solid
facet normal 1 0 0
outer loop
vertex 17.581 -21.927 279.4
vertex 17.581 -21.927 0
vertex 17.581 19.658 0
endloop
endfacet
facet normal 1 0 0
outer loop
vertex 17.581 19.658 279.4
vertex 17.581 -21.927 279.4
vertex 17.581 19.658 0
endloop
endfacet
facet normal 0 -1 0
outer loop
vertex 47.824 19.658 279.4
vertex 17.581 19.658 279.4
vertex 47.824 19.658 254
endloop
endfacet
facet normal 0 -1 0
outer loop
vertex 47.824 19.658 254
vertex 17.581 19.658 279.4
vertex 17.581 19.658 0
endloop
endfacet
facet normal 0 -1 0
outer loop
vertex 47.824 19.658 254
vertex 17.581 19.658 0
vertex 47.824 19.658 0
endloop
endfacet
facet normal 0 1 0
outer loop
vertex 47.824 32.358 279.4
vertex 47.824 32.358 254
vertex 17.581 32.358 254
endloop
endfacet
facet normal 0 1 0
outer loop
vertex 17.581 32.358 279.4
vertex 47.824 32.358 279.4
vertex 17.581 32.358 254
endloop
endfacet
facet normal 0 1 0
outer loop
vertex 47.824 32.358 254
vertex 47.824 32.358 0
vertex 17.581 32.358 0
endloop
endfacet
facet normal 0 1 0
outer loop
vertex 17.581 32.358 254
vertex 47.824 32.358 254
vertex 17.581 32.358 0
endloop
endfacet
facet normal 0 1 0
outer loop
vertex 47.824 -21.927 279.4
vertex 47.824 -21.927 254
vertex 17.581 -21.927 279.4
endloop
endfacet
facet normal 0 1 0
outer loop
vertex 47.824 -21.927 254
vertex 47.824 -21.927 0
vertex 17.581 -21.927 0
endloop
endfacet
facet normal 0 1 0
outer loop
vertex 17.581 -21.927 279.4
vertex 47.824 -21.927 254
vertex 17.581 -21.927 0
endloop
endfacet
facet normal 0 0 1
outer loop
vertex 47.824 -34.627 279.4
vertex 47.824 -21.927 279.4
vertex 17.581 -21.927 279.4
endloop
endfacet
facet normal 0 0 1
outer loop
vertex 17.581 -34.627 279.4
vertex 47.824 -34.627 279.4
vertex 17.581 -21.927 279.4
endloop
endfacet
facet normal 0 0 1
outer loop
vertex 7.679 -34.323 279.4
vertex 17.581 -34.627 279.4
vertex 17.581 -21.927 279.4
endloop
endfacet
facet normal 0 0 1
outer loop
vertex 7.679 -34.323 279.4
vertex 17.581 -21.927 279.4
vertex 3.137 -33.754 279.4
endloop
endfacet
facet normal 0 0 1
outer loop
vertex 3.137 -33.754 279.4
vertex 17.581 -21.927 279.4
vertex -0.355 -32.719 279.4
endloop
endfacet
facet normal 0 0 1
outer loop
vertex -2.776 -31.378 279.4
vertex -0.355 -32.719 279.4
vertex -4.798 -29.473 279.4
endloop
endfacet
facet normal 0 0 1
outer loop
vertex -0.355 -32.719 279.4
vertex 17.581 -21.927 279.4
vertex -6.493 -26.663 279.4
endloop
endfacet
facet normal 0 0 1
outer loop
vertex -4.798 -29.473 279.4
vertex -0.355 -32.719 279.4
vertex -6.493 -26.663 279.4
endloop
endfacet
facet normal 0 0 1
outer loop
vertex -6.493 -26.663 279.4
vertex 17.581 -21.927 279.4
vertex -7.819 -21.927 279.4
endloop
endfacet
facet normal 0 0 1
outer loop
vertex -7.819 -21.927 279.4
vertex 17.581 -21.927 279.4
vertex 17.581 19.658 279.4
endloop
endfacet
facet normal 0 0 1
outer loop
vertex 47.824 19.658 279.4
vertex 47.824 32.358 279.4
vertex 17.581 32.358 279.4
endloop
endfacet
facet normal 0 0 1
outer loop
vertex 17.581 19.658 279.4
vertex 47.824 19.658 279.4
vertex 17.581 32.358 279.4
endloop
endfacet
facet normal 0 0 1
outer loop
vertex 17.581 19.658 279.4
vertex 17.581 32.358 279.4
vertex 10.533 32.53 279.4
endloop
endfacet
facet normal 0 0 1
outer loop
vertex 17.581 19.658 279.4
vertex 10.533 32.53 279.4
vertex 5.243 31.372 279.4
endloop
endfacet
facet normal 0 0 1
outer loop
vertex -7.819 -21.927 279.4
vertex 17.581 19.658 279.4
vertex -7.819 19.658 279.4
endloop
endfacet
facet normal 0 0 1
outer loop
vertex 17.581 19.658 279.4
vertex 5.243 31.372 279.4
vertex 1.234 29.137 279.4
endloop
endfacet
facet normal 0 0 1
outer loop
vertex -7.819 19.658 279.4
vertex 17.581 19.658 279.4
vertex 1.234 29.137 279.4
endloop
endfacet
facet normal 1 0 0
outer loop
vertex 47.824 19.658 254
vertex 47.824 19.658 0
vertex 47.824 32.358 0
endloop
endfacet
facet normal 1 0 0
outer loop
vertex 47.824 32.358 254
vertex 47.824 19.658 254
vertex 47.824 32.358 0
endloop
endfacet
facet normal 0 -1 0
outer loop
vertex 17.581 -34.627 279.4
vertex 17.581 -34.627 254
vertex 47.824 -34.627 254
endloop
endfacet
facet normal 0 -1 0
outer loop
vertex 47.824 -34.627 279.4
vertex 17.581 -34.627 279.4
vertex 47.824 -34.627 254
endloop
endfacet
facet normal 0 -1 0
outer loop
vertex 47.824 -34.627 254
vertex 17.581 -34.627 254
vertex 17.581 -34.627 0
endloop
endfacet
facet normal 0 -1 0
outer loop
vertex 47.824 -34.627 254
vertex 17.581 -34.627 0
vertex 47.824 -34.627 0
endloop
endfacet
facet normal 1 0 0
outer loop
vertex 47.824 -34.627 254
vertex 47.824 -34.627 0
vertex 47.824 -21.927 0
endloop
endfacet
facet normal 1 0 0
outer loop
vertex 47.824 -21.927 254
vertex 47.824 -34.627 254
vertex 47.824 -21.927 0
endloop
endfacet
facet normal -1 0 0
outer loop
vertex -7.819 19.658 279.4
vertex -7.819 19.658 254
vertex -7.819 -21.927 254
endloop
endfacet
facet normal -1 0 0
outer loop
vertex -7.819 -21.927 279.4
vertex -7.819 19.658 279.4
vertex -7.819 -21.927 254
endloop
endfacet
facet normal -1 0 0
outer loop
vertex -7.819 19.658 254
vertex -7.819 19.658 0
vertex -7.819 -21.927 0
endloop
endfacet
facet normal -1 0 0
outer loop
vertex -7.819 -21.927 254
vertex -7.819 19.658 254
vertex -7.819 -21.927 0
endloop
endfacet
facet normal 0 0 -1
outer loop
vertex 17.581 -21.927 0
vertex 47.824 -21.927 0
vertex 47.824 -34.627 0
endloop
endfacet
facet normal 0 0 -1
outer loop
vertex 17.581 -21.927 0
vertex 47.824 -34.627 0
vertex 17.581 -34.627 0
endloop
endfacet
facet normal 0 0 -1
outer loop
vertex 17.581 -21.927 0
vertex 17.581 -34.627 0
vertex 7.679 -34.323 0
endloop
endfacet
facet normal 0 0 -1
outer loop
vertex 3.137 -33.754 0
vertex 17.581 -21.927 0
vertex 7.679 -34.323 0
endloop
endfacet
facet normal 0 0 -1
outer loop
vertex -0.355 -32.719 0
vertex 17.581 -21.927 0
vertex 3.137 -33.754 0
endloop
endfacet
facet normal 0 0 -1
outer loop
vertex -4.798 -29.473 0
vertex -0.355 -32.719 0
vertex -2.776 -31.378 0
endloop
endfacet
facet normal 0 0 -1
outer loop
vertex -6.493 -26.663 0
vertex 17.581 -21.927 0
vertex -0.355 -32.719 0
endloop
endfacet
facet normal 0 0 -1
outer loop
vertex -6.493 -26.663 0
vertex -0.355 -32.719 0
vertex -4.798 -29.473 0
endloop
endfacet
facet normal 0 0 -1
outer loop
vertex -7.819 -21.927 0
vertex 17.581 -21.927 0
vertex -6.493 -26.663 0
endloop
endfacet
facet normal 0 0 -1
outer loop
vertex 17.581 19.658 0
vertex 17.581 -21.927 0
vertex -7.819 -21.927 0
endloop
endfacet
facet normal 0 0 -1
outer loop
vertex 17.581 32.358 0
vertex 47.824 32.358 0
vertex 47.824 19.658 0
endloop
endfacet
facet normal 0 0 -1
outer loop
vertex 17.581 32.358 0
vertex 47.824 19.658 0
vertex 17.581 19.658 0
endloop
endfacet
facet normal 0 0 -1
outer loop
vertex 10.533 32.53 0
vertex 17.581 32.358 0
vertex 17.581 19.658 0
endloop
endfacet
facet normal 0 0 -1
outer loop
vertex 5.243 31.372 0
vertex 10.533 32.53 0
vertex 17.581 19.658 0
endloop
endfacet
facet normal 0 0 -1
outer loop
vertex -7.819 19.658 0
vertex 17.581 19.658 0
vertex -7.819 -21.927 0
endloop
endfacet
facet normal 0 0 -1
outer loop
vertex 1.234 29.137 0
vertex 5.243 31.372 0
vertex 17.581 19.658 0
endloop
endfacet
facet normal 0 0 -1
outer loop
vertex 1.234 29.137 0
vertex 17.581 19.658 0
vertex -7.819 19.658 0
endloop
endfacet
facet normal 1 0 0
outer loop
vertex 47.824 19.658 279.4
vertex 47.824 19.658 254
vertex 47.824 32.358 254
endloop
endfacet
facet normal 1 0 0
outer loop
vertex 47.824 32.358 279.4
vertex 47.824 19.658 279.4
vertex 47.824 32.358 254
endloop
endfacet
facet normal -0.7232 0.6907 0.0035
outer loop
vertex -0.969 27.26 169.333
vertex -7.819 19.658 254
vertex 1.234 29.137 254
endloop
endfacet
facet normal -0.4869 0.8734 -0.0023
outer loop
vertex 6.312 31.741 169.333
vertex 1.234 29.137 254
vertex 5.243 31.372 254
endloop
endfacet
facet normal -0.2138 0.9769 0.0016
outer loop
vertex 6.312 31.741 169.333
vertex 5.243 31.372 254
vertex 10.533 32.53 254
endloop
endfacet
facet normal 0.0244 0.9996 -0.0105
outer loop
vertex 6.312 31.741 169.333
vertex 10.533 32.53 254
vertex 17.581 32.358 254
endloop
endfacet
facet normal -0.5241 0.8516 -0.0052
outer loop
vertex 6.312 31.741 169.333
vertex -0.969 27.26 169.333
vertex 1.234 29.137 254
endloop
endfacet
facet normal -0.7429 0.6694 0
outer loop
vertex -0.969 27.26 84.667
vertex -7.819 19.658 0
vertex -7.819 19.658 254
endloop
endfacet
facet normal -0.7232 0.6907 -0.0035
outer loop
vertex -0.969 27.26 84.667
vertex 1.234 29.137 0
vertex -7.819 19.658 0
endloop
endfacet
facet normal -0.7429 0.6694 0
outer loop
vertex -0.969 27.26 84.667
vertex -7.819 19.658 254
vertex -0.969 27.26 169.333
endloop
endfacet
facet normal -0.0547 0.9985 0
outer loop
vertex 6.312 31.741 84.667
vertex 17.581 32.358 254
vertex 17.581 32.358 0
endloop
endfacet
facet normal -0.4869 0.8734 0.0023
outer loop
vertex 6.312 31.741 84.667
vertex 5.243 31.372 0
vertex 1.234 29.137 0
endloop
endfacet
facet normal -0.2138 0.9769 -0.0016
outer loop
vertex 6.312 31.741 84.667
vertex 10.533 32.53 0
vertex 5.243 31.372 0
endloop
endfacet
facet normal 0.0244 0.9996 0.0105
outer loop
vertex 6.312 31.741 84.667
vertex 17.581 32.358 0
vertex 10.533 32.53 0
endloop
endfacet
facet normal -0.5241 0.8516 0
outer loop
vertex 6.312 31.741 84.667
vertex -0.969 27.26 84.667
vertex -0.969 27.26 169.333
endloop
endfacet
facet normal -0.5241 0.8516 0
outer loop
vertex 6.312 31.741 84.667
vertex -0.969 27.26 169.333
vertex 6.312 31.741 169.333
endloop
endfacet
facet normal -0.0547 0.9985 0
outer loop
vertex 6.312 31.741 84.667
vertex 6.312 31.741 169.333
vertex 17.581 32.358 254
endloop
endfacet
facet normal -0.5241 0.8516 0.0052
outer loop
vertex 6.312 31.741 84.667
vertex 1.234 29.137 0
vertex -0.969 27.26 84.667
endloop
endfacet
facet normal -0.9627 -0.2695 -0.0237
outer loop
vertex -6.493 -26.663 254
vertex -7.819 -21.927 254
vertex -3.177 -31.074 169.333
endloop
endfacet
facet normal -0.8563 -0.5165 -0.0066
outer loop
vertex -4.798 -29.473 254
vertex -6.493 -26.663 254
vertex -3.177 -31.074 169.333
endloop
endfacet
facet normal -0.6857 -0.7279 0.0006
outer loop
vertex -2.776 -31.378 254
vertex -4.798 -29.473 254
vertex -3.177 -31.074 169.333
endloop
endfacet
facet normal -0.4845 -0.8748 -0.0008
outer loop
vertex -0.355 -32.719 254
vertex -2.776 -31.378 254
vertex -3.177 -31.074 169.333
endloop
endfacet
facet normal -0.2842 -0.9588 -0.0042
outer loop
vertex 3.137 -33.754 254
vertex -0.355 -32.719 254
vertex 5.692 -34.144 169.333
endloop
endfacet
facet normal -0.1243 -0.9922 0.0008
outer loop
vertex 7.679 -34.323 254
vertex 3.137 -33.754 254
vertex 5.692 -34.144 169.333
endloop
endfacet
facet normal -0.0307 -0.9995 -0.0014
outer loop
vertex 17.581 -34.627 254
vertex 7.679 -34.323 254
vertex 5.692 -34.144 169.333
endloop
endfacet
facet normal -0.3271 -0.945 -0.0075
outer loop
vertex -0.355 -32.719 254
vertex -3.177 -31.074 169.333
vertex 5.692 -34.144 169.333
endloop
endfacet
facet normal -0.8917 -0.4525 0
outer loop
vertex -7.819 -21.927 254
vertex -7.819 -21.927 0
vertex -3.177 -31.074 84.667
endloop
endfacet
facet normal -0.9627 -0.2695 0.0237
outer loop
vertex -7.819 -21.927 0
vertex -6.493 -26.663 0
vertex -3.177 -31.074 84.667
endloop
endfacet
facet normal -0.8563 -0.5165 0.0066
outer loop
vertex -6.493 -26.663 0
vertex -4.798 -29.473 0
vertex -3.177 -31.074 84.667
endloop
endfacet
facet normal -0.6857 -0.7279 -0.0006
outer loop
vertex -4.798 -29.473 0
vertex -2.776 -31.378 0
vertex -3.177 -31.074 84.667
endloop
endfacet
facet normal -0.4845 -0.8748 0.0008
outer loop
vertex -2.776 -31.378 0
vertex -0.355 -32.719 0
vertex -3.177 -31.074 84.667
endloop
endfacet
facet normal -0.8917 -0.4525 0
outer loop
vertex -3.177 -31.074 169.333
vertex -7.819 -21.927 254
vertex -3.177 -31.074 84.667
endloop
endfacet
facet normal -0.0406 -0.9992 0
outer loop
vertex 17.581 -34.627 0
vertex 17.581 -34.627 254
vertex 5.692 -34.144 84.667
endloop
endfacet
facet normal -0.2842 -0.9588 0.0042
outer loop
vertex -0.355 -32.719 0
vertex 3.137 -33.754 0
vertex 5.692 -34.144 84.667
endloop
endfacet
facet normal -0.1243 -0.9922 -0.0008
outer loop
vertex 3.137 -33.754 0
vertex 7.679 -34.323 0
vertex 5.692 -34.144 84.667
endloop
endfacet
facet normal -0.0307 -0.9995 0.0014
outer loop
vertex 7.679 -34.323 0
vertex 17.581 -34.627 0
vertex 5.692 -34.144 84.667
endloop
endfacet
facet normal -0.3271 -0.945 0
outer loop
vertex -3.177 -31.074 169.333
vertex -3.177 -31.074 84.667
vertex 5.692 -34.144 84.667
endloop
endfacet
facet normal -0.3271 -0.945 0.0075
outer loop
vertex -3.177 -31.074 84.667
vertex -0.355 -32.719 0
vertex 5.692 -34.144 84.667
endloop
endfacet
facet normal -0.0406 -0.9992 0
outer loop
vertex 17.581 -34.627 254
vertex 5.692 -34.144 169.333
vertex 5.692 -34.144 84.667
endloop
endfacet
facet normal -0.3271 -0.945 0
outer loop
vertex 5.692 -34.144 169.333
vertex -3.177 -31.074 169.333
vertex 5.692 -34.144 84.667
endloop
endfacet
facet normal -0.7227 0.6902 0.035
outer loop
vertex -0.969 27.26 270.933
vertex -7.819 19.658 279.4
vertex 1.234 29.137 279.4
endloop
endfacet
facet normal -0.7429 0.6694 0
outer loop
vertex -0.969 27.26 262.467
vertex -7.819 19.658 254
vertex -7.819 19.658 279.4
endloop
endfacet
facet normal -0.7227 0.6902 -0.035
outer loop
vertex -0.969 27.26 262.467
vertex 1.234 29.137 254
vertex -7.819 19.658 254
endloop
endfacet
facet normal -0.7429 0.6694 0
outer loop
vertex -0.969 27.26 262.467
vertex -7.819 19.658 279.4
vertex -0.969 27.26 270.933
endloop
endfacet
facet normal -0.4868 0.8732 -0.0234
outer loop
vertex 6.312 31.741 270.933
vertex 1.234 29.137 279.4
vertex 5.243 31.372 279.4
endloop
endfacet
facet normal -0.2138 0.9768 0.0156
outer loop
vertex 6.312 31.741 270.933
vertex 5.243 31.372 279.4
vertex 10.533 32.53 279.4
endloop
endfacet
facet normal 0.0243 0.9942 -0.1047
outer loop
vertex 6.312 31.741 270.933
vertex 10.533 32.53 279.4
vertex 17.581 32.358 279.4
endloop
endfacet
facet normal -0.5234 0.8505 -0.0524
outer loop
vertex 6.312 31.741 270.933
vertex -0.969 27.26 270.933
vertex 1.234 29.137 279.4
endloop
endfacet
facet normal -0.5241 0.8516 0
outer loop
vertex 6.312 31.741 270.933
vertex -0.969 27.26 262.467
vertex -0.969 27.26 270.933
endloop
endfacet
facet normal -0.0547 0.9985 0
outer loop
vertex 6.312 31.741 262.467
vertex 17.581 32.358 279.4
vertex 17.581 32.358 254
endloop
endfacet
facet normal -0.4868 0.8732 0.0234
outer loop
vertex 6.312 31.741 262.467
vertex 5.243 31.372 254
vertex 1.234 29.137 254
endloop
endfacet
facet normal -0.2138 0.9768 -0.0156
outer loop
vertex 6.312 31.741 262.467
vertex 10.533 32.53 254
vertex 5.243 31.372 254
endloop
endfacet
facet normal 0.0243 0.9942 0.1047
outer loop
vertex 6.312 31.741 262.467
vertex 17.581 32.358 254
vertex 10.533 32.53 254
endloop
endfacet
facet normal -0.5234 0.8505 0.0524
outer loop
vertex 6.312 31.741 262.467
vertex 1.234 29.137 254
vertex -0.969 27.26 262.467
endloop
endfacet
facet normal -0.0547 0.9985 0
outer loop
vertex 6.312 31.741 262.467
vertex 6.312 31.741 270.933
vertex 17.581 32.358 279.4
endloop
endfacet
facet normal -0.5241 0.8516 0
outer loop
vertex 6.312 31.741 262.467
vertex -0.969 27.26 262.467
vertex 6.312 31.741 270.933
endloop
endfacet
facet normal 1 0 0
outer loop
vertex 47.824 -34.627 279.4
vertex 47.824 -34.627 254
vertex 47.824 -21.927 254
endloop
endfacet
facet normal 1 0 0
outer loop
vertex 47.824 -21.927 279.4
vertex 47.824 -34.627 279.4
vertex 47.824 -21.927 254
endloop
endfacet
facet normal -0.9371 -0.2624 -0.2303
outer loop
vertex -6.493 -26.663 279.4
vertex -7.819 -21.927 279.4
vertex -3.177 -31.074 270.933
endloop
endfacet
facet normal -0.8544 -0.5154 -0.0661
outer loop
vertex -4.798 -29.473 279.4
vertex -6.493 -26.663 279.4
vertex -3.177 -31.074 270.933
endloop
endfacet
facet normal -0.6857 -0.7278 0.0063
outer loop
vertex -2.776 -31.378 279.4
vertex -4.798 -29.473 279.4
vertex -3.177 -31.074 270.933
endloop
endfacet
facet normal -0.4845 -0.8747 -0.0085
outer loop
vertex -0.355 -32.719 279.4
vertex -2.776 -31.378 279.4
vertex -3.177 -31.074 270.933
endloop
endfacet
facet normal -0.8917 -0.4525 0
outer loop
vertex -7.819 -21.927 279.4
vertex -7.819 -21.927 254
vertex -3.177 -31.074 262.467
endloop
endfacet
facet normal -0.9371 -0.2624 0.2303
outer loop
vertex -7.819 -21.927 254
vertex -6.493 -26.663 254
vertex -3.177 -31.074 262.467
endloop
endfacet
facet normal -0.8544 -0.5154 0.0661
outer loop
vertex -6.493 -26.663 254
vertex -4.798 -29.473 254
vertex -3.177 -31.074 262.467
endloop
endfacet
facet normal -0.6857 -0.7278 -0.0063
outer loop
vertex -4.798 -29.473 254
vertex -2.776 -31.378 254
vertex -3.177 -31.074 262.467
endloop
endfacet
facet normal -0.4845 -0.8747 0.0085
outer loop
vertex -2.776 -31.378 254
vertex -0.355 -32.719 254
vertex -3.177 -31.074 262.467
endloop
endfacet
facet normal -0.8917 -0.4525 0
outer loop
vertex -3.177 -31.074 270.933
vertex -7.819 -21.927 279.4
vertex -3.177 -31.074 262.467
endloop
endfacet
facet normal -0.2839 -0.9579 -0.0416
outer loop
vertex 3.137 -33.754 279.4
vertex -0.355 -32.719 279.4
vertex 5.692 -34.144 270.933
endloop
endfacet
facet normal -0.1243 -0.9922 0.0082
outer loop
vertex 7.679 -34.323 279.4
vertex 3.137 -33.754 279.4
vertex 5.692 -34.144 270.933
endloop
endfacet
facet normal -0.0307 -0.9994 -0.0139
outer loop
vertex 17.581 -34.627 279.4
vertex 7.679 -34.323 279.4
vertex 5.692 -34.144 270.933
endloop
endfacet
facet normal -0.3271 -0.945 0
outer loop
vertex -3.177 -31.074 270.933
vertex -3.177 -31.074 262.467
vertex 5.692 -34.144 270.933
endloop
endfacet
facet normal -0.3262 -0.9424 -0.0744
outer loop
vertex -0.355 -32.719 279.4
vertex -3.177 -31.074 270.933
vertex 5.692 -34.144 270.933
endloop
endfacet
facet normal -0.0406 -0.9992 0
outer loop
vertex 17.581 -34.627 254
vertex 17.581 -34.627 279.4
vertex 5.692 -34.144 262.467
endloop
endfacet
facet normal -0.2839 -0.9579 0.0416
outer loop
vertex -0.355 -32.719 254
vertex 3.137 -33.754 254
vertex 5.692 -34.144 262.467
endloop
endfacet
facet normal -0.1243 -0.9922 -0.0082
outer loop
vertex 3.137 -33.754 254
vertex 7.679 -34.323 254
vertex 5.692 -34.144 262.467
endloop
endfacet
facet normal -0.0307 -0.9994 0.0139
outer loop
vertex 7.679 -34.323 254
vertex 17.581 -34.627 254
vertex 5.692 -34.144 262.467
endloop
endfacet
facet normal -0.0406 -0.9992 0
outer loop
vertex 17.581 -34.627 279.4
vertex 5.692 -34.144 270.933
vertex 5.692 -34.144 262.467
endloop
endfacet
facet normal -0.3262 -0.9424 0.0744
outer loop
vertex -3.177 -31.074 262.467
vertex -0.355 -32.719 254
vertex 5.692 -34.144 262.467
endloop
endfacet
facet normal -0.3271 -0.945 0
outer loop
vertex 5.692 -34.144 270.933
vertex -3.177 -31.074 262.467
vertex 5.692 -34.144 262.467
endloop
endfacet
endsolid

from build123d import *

# Parameters (mm, degrees)
F0_W     = 30.243722
F0_H     = 12.7
F1_DEPTH = 254
F2_DEPTH = 25.4


with BuildPart() as f1:
    # F0 (on Top) → F1 (new body)
    with BuildSketch(Plane.XY):
        with BuildLine():
            add(Edge.make_bspline(
                [(-7.819359, 19.657847), (0, 28.573312), (3.134033, 33.92129), (17.580641, 32.357847)],
                knots=[0, 0, 0, 0, 28.398063, 28.398063, 28.398063, 28.398063], degree=3))
            Line((-7.819359, 19.657847), (17.580641, 19.657847))
            Line((17.580641, 19.657847), (17.580641, 32.357847))
        make_face()
        Polygon((17.580641, 19.657847), (-7.819359, 19.657847), (-7.819359, -21.92727), (17.580641, -21.92727), (17.580641, -16.079364), align=None)
        with Locations((32.702502, 26.007847)):
            Rectangle(F0_W, F0_H)
        with BuildLine():
            Line((17.580641, -21.92727), (-7.819359, -21.92727))
            add(Edge.make_bspline(
                [(-7.819359, -21.92727), (-5.692848, -35.277039), (4.585292, -34.272849), (17.580641, -34.62727)],
                knots=[0, 0, 0, 0, 28.398063, 28.398063, 28.398063, 28.398063], degree=3))
            Line((17.580641, -34.62727), (17.580641, -21.92727))
        make_face()
        with Locations((32.702502, -28.27727)):
            Rectangle(F0_W, F0_H)
    extrude(amount=F1_DEPTH)

    # F1_face (on face) → F2 (join)
    with BuildSketch(Plane(origin=(14.443133, -1.495159, 254), x_dir=(1, 0, 0), z_dir=(0, 0, 1))):
        with BuildLine():
            add(Edge.make_bspline(
                [(-22.262492, 21.153006), (-14.443133, 30.068472), (-11.3091, 35.416449), (3.137508, 33.853006)],
                knots=[0, 0, 0, 0, 28.398063, 28.398063, 28.398063, 28.398063], degree=3))
            Line((-22.262492, 21.153006), (-22.262492, -20.432111))
            add(Edge.make_bspline(
                [(-22.262492, -20.432111), (-20.135981, -33.781879), (-9.857842, -32.77769), (3.137508, -33.132111)],
                knots=[0, 0, 0, 0, 28.398063, 28.398063, 28.398063, 28.398063], degree=3))
            Line((3.137508, -33.132111), (33.381229, -33.132111))
            Line((33.381229, -33.132111), (33.381229, -20.432111))
            Line((33.381229, -20.432111), (3.137508, -20.432111))
            Line((3.137508, -20.432111), (3.137508, 21.153006))
            Line((3.137508, 21.153006), (33.381229, 21.153006))
            Line((33.381229, 21.153006), (33.381229, 33.853006))
            Line((33.381229, 33.853006), (3.137508, 33.853006))
        make_face()
    extrude(amount=F2_DEPTH)


solid = f1.part
